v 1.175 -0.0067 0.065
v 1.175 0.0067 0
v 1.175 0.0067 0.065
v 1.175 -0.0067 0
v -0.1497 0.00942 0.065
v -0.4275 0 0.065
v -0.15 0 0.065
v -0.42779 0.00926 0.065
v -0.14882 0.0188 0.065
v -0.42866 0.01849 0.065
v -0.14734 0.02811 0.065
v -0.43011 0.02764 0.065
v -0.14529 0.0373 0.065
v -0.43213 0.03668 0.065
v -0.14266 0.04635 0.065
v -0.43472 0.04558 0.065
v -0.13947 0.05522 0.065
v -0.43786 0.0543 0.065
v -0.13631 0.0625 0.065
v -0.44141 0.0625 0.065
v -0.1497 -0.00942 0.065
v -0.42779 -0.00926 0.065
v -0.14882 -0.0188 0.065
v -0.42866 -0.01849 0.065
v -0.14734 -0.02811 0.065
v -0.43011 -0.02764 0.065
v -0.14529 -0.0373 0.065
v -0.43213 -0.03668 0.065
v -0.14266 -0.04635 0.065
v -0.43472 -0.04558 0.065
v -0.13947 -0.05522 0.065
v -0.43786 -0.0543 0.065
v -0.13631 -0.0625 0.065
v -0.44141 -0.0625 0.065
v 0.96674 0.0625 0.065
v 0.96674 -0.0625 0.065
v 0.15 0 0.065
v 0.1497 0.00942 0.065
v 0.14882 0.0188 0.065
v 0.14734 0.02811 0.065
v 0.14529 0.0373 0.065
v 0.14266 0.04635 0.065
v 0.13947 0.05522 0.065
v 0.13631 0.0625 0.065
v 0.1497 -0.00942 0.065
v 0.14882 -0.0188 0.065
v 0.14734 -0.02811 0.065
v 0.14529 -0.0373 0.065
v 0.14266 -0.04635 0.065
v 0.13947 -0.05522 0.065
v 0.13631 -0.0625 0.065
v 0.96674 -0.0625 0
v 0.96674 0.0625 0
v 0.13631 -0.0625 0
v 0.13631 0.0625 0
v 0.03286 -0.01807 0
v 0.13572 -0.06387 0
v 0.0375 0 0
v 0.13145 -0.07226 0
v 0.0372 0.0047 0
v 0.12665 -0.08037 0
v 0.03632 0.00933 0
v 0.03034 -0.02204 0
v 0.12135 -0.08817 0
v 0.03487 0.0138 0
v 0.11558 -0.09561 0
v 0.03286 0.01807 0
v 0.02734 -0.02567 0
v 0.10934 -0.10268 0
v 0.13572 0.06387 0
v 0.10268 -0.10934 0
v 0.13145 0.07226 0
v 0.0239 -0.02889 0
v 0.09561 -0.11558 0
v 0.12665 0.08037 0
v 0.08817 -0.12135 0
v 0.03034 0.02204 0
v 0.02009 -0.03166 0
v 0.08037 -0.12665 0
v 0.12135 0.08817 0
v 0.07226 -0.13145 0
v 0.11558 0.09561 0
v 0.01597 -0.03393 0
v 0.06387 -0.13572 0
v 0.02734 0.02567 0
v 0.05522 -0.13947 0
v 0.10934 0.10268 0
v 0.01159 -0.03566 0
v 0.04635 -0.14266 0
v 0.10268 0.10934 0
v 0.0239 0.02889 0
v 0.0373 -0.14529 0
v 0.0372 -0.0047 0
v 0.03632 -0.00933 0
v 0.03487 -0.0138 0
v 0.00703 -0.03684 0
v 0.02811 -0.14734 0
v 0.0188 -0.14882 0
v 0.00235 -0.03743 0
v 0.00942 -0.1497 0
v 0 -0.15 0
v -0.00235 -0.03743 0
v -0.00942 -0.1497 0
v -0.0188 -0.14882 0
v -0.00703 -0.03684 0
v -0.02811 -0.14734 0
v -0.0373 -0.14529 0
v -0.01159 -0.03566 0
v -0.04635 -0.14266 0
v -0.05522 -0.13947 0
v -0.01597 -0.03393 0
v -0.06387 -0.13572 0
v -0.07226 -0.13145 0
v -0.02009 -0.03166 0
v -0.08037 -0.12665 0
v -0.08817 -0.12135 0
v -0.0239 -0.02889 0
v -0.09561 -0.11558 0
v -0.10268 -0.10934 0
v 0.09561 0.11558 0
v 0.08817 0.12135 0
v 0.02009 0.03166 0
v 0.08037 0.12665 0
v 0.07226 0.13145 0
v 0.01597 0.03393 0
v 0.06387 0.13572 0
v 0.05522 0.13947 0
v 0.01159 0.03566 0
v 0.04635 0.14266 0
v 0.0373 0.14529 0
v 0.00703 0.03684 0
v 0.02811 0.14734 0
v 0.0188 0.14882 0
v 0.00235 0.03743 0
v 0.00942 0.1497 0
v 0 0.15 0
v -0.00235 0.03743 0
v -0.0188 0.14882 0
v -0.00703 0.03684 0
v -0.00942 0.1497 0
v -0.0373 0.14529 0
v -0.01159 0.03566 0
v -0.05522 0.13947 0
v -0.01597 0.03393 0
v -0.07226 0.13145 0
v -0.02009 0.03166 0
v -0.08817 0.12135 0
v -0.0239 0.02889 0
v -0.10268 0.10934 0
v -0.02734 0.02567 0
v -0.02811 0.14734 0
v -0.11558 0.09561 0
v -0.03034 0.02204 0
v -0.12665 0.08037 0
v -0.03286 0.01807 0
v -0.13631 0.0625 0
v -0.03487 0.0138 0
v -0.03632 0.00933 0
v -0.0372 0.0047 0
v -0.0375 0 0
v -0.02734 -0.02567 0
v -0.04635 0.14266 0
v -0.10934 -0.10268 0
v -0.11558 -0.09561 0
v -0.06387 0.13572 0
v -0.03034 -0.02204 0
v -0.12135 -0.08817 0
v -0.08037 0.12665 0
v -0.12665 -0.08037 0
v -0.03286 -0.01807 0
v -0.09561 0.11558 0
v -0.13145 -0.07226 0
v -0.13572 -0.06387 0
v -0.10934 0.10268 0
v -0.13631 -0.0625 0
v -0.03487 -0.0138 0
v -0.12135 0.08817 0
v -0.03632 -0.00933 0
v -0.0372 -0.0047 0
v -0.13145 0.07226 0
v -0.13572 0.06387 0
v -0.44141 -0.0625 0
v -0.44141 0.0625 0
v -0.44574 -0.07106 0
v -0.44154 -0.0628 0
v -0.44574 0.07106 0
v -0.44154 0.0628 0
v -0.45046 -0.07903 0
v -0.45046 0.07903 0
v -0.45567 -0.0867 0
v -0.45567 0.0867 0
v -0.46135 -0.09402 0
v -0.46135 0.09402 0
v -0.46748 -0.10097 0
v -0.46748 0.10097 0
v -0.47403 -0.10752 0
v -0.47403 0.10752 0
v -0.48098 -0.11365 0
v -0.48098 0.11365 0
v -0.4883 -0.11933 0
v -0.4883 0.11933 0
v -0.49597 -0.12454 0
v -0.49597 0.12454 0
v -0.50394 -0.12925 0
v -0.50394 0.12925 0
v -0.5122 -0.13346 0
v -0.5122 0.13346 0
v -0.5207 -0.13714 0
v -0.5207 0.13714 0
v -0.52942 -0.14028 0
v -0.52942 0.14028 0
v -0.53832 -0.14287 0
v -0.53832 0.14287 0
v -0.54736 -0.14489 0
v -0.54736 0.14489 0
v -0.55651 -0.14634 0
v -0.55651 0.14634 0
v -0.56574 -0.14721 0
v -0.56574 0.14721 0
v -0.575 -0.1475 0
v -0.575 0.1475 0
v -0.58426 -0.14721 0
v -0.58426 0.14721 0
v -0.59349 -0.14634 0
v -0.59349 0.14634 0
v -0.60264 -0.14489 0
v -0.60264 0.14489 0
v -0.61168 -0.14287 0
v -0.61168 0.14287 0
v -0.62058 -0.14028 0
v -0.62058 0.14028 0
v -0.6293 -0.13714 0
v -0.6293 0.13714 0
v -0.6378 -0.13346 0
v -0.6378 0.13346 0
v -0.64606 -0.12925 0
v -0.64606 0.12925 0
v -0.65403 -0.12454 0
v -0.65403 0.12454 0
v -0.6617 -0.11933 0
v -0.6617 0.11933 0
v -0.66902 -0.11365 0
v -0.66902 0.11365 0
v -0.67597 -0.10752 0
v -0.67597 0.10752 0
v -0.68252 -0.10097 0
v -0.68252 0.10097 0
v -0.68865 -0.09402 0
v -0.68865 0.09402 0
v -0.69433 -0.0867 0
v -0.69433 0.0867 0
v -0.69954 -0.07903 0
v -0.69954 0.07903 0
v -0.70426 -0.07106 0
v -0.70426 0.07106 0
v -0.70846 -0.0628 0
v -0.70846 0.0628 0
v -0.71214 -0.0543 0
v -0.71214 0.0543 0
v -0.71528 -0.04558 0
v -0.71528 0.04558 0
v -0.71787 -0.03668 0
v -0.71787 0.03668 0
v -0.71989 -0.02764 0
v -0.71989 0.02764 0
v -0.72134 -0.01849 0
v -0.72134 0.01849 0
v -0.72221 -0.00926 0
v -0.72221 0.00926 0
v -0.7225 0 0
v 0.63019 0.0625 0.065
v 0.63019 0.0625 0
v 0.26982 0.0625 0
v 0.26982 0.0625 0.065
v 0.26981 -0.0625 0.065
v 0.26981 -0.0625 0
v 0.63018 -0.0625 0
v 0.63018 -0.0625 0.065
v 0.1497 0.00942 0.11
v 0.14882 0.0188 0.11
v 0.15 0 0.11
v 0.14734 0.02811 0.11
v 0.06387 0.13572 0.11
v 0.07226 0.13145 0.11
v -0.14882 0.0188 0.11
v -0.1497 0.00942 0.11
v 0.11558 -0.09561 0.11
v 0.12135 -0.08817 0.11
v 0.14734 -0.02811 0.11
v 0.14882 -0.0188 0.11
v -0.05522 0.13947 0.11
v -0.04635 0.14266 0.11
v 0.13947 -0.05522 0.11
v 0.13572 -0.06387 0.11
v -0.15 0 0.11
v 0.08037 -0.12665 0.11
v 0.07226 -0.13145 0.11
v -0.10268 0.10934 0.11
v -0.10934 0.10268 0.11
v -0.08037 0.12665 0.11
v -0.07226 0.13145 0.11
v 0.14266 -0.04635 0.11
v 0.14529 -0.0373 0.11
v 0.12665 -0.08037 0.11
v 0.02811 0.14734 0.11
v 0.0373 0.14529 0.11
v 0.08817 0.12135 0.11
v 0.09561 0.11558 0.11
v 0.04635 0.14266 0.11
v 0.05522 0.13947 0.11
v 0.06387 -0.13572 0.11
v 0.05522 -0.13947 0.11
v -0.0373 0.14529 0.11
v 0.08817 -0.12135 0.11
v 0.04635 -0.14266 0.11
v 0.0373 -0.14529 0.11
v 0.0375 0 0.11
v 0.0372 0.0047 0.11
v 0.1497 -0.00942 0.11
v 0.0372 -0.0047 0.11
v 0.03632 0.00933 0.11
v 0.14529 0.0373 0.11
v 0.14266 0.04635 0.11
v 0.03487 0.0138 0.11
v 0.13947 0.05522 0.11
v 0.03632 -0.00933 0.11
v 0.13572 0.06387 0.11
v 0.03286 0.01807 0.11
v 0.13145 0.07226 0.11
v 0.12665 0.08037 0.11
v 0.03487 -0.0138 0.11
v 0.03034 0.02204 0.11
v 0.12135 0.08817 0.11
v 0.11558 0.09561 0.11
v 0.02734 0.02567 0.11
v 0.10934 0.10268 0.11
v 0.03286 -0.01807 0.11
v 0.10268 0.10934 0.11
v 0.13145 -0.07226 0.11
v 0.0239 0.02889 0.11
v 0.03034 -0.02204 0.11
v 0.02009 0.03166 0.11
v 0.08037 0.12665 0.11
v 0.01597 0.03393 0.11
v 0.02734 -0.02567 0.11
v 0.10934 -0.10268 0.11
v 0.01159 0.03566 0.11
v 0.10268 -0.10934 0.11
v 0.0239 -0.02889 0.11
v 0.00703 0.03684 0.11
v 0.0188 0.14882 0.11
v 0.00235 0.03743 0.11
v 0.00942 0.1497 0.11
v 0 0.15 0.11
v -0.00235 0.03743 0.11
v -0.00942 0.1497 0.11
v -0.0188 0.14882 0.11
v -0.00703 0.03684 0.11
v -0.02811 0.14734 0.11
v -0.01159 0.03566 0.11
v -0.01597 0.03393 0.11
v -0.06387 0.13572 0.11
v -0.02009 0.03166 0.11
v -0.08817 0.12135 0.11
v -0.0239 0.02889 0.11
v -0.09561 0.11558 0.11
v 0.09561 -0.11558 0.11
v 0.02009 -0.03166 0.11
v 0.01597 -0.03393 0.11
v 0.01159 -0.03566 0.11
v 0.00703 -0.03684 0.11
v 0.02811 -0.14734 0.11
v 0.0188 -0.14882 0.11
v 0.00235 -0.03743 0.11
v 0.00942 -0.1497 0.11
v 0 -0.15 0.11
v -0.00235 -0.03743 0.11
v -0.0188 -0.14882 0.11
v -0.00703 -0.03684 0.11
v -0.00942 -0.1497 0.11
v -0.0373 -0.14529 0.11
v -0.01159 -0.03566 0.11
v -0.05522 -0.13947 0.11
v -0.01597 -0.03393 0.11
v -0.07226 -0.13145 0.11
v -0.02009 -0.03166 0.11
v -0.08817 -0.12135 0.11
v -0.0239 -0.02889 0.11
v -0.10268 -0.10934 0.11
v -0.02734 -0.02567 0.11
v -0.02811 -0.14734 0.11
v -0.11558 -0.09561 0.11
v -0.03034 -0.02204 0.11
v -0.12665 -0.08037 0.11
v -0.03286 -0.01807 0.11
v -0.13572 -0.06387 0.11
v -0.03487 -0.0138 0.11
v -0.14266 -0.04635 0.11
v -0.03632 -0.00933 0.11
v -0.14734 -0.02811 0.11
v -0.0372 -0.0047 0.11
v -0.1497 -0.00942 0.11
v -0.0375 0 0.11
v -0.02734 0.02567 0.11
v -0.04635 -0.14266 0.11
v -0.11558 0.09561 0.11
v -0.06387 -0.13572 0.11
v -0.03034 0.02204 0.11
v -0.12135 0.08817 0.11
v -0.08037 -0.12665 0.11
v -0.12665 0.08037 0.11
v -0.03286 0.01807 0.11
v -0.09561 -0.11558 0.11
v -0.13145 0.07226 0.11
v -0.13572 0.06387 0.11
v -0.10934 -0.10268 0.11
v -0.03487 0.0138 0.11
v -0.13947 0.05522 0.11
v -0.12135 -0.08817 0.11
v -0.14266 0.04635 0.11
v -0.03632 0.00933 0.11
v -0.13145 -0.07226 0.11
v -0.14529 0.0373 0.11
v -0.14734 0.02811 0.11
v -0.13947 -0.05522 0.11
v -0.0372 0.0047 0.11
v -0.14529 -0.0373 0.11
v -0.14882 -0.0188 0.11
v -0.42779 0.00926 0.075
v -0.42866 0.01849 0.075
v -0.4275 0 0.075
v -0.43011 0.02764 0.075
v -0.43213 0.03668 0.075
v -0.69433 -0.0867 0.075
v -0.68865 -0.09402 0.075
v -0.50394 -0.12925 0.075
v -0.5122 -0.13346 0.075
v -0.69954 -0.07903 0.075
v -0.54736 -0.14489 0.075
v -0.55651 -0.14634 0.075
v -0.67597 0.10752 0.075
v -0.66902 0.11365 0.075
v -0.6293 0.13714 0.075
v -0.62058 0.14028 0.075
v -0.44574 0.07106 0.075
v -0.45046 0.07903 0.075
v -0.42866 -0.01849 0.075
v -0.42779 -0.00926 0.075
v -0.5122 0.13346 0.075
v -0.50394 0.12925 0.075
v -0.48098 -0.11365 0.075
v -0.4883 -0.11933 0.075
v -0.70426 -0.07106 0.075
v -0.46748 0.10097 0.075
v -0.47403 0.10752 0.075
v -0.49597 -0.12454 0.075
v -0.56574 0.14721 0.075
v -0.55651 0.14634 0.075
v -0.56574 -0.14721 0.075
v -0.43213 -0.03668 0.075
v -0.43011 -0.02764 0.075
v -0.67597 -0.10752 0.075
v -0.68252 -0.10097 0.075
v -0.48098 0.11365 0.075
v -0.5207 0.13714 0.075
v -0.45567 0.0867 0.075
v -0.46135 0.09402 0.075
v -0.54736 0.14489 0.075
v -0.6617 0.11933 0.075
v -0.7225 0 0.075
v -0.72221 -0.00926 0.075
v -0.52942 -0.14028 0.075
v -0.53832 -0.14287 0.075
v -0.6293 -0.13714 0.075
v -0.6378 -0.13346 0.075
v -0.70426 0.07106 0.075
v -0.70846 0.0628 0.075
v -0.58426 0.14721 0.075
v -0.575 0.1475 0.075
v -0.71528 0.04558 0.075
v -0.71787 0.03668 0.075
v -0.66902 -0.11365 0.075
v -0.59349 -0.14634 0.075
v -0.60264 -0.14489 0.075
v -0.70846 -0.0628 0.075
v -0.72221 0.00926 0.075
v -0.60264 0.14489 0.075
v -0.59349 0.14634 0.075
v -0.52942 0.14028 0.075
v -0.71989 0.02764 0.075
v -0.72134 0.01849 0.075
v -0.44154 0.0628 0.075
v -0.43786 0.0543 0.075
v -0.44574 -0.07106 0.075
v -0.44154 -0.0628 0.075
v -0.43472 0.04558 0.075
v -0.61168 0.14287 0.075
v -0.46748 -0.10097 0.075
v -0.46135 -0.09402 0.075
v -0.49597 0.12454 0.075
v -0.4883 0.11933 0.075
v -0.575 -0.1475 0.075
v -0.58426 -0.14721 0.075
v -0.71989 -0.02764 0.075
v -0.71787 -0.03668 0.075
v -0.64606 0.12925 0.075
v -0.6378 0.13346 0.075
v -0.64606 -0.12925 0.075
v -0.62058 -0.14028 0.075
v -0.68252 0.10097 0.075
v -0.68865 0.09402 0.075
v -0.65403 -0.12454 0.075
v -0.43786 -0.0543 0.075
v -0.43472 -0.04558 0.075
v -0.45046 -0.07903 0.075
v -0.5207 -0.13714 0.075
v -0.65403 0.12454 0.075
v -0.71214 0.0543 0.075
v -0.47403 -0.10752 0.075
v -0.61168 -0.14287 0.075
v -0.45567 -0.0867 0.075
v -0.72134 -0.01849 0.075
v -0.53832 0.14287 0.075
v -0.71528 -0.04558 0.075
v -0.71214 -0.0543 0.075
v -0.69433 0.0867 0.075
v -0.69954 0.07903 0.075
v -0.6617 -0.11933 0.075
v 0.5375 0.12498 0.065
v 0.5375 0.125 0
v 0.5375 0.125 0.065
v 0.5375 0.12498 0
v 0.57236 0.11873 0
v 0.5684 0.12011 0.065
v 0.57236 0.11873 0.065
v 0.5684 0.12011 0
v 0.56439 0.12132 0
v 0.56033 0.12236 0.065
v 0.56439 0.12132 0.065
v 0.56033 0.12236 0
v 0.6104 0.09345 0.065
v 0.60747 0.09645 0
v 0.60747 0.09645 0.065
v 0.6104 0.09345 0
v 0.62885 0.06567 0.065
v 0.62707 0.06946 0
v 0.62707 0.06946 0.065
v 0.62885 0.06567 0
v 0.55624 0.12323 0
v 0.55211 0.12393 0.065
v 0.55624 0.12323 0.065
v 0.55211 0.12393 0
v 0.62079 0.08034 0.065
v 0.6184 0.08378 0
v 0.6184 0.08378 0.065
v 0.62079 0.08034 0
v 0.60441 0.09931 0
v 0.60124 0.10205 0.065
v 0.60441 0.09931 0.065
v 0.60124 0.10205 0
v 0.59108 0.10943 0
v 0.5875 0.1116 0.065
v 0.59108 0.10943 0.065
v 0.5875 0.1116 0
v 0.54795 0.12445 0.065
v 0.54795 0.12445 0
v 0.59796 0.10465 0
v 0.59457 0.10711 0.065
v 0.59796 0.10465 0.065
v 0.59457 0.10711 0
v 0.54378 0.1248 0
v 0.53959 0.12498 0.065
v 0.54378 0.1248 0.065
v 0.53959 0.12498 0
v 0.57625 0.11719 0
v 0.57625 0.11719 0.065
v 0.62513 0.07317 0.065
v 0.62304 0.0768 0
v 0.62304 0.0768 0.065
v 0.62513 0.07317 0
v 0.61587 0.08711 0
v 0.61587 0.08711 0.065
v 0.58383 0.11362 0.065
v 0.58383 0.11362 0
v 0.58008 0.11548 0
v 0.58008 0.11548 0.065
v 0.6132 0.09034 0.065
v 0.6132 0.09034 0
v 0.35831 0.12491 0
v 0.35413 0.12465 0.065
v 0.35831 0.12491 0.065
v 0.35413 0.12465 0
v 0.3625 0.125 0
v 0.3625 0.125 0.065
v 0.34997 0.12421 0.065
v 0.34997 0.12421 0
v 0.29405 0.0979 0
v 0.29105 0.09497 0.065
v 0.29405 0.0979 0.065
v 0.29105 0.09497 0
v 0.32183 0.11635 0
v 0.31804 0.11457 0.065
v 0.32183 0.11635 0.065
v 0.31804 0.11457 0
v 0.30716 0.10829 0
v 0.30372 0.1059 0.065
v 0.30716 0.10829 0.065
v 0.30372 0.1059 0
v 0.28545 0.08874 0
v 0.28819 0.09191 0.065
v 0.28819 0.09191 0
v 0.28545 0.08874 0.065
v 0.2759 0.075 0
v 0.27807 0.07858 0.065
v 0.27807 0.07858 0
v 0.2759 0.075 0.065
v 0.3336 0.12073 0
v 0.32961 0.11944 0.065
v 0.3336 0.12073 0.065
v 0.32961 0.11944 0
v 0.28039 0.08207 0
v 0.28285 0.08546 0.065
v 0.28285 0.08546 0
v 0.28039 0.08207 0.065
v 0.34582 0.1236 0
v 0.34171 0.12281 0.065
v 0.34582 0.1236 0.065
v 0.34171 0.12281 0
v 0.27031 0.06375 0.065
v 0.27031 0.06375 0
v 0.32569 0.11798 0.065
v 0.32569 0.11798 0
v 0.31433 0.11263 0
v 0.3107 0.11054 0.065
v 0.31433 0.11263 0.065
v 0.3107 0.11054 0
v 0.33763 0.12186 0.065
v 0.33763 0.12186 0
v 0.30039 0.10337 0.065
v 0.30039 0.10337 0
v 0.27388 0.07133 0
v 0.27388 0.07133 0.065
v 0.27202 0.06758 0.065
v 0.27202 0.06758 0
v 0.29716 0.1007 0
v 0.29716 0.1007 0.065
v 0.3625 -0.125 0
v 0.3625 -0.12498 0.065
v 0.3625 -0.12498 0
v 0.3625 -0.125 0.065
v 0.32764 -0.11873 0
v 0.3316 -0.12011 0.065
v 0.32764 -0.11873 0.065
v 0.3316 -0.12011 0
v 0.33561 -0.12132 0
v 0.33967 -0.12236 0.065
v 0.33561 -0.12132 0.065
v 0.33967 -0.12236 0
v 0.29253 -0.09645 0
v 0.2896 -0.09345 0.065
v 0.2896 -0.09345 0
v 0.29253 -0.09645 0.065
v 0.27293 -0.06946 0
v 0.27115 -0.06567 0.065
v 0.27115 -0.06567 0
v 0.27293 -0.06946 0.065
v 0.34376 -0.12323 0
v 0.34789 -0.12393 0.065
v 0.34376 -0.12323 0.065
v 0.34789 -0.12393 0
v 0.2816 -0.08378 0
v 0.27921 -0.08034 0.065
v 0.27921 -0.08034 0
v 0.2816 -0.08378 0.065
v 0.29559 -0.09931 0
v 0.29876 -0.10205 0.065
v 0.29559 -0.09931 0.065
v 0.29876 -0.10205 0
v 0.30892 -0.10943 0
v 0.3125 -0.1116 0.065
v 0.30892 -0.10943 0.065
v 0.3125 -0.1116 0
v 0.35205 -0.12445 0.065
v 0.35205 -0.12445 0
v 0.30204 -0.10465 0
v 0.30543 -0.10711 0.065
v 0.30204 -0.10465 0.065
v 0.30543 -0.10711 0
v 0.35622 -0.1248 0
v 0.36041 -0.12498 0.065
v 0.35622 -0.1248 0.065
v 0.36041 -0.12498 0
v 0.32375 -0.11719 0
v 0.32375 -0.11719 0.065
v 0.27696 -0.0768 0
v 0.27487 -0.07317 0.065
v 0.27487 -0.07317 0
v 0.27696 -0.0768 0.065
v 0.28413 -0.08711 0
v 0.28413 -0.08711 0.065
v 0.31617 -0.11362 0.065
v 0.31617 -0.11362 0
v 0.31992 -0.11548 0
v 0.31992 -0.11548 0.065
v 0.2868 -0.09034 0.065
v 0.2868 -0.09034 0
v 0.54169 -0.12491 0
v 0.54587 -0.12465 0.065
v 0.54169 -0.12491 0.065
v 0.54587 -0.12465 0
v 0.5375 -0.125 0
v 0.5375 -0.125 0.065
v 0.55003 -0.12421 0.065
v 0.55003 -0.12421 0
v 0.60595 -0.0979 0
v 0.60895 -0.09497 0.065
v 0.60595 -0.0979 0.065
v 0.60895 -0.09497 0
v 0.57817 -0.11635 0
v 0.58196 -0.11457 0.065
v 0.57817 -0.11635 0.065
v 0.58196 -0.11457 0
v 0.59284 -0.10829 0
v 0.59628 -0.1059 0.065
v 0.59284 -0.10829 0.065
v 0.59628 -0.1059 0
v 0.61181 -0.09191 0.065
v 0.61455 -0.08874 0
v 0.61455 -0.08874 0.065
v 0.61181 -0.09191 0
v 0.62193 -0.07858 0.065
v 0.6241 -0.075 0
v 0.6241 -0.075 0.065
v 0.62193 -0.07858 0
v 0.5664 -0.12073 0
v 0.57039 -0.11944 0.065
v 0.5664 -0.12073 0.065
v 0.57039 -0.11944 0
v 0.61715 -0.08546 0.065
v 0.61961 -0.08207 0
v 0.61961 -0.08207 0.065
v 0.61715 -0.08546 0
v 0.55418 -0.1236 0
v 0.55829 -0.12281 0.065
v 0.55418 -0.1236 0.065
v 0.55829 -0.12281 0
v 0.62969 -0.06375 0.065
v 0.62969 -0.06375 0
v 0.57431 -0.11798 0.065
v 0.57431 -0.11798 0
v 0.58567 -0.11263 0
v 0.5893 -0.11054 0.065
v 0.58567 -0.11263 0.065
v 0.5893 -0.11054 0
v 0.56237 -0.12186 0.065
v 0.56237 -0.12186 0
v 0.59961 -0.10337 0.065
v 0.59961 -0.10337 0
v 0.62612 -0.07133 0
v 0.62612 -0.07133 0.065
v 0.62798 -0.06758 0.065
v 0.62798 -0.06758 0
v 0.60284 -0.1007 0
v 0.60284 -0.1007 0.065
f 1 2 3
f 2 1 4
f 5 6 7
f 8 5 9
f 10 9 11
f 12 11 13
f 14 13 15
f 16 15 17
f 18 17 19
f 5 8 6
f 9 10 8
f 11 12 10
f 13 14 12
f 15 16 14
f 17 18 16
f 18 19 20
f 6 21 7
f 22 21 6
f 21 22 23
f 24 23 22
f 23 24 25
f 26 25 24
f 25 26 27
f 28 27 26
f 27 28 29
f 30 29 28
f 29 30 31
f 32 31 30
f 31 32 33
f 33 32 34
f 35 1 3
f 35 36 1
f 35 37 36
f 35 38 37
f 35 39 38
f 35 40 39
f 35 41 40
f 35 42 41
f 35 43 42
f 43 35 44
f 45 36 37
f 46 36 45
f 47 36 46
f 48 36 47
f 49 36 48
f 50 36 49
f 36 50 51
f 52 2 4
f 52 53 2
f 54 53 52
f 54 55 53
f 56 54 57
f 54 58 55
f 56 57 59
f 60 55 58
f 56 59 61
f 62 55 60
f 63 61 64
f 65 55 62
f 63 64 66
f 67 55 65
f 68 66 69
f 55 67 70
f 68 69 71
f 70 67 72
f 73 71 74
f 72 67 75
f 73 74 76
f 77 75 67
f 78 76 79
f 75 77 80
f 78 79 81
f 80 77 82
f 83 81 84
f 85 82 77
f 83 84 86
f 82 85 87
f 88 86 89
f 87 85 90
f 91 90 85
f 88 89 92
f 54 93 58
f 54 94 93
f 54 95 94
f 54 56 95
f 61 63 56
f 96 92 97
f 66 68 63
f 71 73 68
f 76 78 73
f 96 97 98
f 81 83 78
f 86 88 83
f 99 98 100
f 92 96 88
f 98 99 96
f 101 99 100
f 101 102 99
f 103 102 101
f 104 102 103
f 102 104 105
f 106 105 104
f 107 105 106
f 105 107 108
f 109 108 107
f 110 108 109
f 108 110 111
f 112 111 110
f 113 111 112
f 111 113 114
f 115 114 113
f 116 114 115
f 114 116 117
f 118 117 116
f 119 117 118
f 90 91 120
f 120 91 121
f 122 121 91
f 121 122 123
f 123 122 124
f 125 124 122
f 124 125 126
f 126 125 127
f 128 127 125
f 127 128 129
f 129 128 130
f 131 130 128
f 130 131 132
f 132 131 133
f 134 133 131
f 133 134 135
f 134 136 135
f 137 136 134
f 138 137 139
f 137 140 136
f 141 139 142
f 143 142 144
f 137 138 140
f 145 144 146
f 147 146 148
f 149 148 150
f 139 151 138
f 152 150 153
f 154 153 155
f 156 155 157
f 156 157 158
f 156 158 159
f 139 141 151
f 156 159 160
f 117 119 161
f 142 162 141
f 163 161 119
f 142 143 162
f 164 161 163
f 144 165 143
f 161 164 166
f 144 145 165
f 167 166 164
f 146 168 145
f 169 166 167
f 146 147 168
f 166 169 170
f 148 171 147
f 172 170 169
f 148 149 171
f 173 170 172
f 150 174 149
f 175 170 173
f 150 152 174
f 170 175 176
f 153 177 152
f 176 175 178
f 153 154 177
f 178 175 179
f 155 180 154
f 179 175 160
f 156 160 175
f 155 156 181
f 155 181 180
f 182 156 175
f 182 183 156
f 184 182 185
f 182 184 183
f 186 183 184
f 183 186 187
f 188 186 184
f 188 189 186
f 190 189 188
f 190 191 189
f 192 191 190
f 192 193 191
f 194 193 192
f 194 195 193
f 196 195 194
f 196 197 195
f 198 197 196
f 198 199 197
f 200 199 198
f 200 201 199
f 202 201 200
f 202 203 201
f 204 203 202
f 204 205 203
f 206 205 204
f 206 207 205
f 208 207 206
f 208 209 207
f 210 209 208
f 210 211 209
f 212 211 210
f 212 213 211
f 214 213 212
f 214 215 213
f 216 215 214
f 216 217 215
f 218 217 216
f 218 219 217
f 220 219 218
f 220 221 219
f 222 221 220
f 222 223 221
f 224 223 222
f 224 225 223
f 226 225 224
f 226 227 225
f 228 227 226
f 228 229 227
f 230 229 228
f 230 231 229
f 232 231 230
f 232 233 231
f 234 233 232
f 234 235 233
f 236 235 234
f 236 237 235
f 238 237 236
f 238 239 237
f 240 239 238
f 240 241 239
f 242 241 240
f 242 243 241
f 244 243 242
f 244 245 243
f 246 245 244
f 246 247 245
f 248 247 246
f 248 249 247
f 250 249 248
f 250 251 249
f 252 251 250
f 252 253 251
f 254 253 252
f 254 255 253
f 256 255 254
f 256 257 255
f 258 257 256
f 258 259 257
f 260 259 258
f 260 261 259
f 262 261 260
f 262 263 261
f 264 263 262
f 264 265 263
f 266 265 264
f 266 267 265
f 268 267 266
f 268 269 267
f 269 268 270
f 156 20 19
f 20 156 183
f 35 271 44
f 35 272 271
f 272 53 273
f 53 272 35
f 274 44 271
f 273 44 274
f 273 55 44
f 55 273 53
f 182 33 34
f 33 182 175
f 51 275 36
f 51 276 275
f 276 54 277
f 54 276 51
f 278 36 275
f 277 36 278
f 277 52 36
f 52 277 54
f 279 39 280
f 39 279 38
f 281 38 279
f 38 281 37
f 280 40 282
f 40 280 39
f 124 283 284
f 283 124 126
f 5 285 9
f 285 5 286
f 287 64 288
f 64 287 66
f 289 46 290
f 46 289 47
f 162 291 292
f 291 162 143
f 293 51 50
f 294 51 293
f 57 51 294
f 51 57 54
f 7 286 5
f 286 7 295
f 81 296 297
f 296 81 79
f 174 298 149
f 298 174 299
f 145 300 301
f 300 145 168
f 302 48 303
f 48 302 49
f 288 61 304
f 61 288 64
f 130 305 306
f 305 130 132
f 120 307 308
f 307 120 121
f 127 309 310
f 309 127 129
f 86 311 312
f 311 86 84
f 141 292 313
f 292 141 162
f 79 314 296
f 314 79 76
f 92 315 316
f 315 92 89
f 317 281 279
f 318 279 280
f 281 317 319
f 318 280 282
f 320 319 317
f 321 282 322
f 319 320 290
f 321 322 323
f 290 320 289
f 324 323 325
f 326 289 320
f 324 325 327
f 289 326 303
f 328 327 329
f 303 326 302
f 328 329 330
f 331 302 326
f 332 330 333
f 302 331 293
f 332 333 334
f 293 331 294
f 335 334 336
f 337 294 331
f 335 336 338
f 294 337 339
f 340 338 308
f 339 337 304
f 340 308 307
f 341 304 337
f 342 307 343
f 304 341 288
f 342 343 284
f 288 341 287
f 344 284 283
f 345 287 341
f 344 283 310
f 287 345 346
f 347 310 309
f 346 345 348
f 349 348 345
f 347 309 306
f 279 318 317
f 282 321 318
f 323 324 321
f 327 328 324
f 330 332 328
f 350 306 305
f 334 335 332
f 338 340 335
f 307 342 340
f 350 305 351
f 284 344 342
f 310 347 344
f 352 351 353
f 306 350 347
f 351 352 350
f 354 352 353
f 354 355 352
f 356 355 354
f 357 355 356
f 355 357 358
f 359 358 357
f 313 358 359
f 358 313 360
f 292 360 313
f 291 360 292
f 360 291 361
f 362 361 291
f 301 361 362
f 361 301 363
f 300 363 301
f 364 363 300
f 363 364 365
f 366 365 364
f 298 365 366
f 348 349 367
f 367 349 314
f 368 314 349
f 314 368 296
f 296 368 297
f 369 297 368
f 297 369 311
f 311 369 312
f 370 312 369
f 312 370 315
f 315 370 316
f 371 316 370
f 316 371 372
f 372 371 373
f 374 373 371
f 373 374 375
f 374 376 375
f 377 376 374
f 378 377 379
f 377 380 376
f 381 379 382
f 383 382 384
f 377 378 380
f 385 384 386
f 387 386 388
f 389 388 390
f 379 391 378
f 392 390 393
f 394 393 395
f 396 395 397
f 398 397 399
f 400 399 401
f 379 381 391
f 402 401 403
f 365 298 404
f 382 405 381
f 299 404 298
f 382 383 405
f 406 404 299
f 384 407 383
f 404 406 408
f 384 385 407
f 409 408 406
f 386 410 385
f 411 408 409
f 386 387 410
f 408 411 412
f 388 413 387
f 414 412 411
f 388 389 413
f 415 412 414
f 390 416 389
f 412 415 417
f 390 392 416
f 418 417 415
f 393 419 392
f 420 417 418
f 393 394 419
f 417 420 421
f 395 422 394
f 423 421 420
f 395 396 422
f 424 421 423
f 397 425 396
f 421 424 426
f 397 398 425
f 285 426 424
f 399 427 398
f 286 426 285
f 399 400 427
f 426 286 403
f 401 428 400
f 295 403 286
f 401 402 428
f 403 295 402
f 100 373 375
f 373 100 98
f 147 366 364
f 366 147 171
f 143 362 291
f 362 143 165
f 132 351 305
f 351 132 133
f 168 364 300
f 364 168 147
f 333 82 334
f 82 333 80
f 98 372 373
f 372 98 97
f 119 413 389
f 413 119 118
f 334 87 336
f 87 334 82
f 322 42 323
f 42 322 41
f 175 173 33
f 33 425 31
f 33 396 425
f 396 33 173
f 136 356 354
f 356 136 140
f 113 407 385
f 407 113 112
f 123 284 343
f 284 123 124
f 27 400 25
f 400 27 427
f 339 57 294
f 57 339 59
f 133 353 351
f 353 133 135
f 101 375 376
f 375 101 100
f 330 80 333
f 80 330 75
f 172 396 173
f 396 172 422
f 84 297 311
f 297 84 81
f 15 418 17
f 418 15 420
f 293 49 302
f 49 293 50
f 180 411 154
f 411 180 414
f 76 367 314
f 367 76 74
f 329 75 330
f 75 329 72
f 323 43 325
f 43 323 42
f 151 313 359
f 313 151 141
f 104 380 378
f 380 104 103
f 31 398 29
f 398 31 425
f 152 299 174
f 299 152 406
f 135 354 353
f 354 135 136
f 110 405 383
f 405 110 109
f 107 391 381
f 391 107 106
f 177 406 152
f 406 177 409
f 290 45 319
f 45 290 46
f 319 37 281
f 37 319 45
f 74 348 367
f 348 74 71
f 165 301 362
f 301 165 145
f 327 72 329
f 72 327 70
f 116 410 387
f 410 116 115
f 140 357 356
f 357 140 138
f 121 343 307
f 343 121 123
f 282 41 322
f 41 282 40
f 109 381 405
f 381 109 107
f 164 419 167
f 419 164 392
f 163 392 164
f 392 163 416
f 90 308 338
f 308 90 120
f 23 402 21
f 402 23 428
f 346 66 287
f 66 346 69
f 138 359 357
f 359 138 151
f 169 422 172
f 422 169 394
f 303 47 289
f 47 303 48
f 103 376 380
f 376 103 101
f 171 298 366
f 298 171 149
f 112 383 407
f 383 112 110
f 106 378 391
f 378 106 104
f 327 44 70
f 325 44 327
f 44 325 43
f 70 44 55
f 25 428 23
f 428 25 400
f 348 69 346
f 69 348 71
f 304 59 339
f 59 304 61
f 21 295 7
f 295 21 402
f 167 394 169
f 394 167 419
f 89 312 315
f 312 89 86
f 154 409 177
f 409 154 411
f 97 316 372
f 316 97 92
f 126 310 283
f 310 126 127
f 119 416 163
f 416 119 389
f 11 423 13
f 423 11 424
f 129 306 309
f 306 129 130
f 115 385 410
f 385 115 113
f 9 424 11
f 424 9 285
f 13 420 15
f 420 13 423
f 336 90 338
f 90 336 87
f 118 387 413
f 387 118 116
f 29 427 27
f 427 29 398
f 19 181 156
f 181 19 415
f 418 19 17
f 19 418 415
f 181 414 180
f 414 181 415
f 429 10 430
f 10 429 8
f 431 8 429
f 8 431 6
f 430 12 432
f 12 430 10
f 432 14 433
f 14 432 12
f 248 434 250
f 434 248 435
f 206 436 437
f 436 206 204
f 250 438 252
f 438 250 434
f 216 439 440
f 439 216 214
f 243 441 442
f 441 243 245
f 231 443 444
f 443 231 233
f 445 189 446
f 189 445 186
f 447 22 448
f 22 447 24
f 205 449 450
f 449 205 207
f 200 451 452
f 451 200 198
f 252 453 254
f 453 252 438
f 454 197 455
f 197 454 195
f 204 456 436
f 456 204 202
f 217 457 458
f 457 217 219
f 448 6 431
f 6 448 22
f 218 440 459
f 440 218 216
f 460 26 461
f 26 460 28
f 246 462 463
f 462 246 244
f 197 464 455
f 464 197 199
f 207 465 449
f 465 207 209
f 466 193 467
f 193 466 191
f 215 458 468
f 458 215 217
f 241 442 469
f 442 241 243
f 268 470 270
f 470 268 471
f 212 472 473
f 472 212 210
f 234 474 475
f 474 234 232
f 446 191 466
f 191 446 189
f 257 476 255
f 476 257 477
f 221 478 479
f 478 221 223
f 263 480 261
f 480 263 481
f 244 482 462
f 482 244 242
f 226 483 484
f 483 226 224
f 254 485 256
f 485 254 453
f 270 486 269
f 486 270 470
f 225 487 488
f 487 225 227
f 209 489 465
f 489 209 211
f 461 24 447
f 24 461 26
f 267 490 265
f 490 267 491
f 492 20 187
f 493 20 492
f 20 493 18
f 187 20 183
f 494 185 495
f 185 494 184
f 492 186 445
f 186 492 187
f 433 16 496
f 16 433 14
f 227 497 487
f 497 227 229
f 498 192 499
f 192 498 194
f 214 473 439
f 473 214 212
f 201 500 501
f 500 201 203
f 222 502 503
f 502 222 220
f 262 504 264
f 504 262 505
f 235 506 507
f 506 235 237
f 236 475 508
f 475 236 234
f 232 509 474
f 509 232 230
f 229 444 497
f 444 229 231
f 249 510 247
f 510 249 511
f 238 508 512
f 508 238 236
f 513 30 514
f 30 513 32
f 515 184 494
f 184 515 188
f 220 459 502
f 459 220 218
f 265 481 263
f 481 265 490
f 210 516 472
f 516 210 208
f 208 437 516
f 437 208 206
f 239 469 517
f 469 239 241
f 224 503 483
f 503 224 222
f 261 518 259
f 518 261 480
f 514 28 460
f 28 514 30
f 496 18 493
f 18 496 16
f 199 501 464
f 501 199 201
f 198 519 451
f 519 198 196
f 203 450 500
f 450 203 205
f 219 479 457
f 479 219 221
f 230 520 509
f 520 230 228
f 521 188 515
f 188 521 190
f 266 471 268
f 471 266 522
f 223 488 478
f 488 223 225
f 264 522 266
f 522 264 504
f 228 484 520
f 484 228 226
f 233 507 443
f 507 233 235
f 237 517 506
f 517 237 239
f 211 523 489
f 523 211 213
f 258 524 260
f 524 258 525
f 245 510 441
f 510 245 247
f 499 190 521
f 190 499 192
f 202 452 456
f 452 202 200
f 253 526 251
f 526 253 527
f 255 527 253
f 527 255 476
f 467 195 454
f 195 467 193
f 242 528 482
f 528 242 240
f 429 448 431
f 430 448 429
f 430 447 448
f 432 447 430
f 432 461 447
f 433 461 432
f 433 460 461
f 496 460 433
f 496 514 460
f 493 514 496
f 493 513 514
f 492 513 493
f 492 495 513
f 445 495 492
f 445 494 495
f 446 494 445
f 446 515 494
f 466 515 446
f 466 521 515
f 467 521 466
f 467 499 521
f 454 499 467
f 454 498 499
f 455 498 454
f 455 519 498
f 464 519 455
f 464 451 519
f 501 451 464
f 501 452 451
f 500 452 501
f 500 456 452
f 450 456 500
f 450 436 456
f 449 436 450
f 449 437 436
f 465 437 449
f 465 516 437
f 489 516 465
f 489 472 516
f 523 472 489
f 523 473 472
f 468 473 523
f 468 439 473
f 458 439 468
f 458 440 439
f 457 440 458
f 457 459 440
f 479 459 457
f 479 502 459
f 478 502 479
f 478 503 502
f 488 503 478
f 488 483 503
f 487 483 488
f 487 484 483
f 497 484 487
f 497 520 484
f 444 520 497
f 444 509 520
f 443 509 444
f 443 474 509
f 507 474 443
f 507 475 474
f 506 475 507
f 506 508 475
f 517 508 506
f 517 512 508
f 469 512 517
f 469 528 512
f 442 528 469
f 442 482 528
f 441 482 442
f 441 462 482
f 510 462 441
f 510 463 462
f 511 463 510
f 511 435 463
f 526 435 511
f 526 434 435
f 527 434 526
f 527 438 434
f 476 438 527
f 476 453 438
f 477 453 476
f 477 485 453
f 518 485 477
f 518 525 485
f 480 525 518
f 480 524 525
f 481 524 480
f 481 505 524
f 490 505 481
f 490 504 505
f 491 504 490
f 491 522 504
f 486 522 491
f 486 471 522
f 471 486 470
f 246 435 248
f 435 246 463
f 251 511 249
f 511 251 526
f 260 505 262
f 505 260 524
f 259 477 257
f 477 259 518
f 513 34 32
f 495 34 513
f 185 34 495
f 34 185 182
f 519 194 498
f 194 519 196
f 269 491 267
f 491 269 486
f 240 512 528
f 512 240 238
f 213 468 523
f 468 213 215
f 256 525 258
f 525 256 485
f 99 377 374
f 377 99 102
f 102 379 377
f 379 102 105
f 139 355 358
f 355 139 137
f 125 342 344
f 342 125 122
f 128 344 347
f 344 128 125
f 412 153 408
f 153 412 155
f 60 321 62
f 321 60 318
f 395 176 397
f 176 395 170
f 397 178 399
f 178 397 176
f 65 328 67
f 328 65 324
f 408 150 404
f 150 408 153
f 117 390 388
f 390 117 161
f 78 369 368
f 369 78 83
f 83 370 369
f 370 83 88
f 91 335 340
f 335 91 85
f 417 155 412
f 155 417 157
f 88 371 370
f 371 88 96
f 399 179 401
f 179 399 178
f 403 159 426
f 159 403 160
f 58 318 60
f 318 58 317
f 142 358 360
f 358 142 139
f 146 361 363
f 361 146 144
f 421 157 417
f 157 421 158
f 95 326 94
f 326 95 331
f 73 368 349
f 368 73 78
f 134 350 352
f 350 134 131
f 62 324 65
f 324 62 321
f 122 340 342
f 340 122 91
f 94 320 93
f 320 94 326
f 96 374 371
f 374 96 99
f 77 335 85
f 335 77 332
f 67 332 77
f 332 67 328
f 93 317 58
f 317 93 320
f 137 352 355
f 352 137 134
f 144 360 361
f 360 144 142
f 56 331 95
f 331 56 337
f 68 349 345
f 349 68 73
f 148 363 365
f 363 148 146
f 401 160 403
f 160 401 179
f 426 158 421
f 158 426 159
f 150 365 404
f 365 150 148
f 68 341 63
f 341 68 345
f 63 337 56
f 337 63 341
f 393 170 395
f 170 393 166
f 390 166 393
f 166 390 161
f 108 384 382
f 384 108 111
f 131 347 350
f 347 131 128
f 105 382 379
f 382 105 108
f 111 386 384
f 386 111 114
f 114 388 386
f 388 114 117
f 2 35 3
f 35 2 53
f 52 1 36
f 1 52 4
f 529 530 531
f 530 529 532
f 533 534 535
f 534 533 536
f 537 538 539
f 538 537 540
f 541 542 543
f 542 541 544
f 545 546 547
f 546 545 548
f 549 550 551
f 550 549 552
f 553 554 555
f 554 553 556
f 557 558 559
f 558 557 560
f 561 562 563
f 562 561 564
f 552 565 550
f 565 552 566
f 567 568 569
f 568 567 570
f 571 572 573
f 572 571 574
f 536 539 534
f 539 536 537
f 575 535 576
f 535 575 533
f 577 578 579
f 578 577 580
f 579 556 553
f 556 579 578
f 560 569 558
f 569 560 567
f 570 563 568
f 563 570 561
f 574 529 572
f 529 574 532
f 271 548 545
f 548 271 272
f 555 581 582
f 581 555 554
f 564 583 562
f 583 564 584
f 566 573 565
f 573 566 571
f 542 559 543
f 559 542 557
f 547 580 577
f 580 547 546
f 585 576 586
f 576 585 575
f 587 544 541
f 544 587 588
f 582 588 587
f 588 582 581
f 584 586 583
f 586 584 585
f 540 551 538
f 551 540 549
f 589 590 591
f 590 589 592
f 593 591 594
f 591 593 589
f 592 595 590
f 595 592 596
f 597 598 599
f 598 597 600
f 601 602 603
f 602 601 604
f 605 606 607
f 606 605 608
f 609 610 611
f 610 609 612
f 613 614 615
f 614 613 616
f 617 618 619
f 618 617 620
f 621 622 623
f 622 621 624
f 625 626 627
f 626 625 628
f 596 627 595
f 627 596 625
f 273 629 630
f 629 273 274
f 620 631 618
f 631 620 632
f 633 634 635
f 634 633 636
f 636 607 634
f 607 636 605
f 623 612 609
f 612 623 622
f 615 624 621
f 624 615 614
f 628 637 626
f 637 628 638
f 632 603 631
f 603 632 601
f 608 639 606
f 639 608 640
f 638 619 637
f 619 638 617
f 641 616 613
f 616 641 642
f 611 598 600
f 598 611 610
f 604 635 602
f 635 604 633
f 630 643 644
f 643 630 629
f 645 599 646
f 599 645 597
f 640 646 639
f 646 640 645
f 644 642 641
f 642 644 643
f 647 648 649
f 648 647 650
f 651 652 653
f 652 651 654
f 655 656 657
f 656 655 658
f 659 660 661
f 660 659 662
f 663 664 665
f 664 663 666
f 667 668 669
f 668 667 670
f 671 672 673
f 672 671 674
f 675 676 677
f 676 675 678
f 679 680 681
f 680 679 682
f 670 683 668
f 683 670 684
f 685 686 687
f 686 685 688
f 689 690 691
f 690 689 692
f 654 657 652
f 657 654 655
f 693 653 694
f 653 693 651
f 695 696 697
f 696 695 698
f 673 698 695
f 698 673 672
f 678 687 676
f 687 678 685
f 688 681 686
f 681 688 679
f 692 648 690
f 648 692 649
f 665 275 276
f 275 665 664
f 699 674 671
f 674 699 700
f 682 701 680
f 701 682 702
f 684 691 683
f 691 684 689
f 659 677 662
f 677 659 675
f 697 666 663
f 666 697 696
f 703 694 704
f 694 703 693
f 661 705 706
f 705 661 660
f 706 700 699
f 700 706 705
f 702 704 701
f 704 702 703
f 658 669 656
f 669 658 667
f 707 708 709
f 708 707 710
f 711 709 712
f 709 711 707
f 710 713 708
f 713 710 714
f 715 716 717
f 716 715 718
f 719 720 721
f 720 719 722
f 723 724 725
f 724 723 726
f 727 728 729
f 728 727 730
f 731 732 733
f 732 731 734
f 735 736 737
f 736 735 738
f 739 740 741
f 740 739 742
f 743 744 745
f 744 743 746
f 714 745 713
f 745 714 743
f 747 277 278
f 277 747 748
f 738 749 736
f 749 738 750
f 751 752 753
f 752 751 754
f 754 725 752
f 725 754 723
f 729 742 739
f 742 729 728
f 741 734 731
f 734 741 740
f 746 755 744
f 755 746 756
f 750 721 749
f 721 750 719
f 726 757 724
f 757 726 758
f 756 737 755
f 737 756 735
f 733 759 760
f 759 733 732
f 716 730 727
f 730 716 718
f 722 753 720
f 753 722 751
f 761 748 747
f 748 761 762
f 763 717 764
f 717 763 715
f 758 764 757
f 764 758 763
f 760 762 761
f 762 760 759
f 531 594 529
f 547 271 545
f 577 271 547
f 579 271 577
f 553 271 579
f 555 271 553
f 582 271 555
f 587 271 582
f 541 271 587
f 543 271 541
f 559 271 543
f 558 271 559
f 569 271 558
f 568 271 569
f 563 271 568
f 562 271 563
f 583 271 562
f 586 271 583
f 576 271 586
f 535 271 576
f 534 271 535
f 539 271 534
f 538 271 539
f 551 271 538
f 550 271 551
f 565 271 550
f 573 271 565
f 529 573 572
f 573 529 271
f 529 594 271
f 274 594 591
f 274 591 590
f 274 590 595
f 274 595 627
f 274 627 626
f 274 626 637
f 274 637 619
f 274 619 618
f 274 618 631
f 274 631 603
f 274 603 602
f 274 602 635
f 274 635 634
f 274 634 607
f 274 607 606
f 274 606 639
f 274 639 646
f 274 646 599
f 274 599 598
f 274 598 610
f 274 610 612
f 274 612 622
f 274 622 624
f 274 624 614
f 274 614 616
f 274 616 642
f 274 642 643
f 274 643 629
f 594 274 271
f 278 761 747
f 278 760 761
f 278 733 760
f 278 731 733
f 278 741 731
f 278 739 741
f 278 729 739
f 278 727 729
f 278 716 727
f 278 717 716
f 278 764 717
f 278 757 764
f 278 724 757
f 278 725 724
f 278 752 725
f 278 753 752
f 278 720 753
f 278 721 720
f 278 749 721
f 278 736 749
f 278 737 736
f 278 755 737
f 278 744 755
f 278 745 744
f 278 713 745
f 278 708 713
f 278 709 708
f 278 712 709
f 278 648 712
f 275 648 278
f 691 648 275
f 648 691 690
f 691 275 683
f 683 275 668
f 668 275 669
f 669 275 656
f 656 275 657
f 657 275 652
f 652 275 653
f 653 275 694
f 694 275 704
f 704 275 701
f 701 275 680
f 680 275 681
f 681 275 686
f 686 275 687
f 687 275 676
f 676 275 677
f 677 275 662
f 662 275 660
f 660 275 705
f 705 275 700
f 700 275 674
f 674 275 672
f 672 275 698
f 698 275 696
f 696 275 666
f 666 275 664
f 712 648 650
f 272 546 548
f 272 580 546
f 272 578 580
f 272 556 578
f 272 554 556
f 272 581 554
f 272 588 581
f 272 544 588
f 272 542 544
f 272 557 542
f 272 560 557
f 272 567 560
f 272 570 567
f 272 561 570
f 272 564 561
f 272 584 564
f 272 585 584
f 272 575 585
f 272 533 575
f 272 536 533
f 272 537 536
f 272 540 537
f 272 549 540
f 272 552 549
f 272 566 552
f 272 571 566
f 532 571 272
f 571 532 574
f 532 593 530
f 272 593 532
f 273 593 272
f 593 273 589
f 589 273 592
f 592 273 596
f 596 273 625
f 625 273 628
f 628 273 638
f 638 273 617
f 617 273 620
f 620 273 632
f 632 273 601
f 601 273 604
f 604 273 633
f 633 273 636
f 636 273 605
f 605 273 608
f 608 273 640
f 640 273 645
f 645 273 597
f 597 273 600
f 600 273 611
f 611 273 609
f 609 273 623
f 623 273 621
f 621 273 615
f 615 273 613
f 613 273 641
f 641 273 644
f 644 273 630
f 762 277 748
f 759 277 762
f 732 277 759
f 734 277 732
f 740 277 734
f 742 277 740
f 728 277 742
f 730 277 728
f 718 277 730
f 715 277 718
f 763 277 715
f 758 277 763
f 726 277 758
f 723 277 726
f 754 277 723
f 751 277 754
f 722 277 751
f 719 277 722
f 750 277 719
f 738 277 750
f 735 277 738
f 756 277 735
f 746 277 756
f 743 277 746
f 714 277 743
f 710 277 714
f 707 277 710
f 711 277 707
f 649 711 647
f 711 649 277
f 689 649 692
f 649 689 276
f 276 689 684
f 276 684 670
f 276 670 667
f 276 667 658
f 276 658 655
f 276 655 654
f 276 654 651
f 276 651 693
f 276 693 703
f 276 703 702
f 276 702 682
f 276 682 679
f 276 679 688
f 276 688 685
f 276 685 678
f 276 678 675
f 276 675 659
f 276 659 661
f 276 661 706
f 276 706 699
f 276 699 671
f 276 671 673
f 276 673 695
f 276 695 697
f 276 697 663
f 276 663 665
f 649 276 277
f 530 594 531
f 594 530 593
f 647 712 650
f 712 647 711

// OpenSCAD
cornerRadius = 0.100;

module CornerRounder(x, y, rot)
{
   translate ([x, y, -0.1])
     rotate(a = rot, v = [0, 0, 1])
       difference () {
         cube([cornerRadius + 0.010, cornerRadius + 0.010, 0.2]);
         cylinder(h = 0.5, r = cornerRadius, center=true, $fn = 150);
       }
}

module needleBadge(x)
{
  translate([x, 0, 0.065/2])
    difference() {
      cube([0.375, 0.250, 0.065], center = true);

      CornerRounder(0.375/2 - cornerRadius, 0.250/2 - cornerRadius, 0);
      CornerRounder(-0.375/2 + cornerRadius, 0.250/2 - cornerRadius, 90);
      CornerRounder(-0.375/2 + cornerRadius, -0.250/2 + cornerRadius, 180);
      CornerRounder(0.375/2 - cornerRadius, -0.250/2 + cornerRadius, 270);
   }
}

union() {
  difference() {
    union() {
      translate([0.525/2, 0, 0.065/2])
        cube([1.825, 0.125, 0.065], center = true);

      cylinder(h = 0.110, d = 0.300, center = false, $fn = 100);

      translate([-0.575, 0, 0])
        cylinder(h = 0.075, d = 0.295, center = false, $fn = 100);
    }

    cylinder(h = 0.500, d = 0.075, center = true, $fn = 50);

    translate([1.825 - 0.525 - .1, 0, 0])
      rotate(a=75, v=[0,0,1])
        translate([0.5, 0, 0])
          cube([1, 1, 1], center = true);

    translate([1.825 - 0.525 - .1, 0, 0])
      rotate(a=-75, v=[0,0,1])
        translate([0.5, 0, 0])
          cube([1, 1, 1], center = true);

  }

  needleBadge(0.45);
}
